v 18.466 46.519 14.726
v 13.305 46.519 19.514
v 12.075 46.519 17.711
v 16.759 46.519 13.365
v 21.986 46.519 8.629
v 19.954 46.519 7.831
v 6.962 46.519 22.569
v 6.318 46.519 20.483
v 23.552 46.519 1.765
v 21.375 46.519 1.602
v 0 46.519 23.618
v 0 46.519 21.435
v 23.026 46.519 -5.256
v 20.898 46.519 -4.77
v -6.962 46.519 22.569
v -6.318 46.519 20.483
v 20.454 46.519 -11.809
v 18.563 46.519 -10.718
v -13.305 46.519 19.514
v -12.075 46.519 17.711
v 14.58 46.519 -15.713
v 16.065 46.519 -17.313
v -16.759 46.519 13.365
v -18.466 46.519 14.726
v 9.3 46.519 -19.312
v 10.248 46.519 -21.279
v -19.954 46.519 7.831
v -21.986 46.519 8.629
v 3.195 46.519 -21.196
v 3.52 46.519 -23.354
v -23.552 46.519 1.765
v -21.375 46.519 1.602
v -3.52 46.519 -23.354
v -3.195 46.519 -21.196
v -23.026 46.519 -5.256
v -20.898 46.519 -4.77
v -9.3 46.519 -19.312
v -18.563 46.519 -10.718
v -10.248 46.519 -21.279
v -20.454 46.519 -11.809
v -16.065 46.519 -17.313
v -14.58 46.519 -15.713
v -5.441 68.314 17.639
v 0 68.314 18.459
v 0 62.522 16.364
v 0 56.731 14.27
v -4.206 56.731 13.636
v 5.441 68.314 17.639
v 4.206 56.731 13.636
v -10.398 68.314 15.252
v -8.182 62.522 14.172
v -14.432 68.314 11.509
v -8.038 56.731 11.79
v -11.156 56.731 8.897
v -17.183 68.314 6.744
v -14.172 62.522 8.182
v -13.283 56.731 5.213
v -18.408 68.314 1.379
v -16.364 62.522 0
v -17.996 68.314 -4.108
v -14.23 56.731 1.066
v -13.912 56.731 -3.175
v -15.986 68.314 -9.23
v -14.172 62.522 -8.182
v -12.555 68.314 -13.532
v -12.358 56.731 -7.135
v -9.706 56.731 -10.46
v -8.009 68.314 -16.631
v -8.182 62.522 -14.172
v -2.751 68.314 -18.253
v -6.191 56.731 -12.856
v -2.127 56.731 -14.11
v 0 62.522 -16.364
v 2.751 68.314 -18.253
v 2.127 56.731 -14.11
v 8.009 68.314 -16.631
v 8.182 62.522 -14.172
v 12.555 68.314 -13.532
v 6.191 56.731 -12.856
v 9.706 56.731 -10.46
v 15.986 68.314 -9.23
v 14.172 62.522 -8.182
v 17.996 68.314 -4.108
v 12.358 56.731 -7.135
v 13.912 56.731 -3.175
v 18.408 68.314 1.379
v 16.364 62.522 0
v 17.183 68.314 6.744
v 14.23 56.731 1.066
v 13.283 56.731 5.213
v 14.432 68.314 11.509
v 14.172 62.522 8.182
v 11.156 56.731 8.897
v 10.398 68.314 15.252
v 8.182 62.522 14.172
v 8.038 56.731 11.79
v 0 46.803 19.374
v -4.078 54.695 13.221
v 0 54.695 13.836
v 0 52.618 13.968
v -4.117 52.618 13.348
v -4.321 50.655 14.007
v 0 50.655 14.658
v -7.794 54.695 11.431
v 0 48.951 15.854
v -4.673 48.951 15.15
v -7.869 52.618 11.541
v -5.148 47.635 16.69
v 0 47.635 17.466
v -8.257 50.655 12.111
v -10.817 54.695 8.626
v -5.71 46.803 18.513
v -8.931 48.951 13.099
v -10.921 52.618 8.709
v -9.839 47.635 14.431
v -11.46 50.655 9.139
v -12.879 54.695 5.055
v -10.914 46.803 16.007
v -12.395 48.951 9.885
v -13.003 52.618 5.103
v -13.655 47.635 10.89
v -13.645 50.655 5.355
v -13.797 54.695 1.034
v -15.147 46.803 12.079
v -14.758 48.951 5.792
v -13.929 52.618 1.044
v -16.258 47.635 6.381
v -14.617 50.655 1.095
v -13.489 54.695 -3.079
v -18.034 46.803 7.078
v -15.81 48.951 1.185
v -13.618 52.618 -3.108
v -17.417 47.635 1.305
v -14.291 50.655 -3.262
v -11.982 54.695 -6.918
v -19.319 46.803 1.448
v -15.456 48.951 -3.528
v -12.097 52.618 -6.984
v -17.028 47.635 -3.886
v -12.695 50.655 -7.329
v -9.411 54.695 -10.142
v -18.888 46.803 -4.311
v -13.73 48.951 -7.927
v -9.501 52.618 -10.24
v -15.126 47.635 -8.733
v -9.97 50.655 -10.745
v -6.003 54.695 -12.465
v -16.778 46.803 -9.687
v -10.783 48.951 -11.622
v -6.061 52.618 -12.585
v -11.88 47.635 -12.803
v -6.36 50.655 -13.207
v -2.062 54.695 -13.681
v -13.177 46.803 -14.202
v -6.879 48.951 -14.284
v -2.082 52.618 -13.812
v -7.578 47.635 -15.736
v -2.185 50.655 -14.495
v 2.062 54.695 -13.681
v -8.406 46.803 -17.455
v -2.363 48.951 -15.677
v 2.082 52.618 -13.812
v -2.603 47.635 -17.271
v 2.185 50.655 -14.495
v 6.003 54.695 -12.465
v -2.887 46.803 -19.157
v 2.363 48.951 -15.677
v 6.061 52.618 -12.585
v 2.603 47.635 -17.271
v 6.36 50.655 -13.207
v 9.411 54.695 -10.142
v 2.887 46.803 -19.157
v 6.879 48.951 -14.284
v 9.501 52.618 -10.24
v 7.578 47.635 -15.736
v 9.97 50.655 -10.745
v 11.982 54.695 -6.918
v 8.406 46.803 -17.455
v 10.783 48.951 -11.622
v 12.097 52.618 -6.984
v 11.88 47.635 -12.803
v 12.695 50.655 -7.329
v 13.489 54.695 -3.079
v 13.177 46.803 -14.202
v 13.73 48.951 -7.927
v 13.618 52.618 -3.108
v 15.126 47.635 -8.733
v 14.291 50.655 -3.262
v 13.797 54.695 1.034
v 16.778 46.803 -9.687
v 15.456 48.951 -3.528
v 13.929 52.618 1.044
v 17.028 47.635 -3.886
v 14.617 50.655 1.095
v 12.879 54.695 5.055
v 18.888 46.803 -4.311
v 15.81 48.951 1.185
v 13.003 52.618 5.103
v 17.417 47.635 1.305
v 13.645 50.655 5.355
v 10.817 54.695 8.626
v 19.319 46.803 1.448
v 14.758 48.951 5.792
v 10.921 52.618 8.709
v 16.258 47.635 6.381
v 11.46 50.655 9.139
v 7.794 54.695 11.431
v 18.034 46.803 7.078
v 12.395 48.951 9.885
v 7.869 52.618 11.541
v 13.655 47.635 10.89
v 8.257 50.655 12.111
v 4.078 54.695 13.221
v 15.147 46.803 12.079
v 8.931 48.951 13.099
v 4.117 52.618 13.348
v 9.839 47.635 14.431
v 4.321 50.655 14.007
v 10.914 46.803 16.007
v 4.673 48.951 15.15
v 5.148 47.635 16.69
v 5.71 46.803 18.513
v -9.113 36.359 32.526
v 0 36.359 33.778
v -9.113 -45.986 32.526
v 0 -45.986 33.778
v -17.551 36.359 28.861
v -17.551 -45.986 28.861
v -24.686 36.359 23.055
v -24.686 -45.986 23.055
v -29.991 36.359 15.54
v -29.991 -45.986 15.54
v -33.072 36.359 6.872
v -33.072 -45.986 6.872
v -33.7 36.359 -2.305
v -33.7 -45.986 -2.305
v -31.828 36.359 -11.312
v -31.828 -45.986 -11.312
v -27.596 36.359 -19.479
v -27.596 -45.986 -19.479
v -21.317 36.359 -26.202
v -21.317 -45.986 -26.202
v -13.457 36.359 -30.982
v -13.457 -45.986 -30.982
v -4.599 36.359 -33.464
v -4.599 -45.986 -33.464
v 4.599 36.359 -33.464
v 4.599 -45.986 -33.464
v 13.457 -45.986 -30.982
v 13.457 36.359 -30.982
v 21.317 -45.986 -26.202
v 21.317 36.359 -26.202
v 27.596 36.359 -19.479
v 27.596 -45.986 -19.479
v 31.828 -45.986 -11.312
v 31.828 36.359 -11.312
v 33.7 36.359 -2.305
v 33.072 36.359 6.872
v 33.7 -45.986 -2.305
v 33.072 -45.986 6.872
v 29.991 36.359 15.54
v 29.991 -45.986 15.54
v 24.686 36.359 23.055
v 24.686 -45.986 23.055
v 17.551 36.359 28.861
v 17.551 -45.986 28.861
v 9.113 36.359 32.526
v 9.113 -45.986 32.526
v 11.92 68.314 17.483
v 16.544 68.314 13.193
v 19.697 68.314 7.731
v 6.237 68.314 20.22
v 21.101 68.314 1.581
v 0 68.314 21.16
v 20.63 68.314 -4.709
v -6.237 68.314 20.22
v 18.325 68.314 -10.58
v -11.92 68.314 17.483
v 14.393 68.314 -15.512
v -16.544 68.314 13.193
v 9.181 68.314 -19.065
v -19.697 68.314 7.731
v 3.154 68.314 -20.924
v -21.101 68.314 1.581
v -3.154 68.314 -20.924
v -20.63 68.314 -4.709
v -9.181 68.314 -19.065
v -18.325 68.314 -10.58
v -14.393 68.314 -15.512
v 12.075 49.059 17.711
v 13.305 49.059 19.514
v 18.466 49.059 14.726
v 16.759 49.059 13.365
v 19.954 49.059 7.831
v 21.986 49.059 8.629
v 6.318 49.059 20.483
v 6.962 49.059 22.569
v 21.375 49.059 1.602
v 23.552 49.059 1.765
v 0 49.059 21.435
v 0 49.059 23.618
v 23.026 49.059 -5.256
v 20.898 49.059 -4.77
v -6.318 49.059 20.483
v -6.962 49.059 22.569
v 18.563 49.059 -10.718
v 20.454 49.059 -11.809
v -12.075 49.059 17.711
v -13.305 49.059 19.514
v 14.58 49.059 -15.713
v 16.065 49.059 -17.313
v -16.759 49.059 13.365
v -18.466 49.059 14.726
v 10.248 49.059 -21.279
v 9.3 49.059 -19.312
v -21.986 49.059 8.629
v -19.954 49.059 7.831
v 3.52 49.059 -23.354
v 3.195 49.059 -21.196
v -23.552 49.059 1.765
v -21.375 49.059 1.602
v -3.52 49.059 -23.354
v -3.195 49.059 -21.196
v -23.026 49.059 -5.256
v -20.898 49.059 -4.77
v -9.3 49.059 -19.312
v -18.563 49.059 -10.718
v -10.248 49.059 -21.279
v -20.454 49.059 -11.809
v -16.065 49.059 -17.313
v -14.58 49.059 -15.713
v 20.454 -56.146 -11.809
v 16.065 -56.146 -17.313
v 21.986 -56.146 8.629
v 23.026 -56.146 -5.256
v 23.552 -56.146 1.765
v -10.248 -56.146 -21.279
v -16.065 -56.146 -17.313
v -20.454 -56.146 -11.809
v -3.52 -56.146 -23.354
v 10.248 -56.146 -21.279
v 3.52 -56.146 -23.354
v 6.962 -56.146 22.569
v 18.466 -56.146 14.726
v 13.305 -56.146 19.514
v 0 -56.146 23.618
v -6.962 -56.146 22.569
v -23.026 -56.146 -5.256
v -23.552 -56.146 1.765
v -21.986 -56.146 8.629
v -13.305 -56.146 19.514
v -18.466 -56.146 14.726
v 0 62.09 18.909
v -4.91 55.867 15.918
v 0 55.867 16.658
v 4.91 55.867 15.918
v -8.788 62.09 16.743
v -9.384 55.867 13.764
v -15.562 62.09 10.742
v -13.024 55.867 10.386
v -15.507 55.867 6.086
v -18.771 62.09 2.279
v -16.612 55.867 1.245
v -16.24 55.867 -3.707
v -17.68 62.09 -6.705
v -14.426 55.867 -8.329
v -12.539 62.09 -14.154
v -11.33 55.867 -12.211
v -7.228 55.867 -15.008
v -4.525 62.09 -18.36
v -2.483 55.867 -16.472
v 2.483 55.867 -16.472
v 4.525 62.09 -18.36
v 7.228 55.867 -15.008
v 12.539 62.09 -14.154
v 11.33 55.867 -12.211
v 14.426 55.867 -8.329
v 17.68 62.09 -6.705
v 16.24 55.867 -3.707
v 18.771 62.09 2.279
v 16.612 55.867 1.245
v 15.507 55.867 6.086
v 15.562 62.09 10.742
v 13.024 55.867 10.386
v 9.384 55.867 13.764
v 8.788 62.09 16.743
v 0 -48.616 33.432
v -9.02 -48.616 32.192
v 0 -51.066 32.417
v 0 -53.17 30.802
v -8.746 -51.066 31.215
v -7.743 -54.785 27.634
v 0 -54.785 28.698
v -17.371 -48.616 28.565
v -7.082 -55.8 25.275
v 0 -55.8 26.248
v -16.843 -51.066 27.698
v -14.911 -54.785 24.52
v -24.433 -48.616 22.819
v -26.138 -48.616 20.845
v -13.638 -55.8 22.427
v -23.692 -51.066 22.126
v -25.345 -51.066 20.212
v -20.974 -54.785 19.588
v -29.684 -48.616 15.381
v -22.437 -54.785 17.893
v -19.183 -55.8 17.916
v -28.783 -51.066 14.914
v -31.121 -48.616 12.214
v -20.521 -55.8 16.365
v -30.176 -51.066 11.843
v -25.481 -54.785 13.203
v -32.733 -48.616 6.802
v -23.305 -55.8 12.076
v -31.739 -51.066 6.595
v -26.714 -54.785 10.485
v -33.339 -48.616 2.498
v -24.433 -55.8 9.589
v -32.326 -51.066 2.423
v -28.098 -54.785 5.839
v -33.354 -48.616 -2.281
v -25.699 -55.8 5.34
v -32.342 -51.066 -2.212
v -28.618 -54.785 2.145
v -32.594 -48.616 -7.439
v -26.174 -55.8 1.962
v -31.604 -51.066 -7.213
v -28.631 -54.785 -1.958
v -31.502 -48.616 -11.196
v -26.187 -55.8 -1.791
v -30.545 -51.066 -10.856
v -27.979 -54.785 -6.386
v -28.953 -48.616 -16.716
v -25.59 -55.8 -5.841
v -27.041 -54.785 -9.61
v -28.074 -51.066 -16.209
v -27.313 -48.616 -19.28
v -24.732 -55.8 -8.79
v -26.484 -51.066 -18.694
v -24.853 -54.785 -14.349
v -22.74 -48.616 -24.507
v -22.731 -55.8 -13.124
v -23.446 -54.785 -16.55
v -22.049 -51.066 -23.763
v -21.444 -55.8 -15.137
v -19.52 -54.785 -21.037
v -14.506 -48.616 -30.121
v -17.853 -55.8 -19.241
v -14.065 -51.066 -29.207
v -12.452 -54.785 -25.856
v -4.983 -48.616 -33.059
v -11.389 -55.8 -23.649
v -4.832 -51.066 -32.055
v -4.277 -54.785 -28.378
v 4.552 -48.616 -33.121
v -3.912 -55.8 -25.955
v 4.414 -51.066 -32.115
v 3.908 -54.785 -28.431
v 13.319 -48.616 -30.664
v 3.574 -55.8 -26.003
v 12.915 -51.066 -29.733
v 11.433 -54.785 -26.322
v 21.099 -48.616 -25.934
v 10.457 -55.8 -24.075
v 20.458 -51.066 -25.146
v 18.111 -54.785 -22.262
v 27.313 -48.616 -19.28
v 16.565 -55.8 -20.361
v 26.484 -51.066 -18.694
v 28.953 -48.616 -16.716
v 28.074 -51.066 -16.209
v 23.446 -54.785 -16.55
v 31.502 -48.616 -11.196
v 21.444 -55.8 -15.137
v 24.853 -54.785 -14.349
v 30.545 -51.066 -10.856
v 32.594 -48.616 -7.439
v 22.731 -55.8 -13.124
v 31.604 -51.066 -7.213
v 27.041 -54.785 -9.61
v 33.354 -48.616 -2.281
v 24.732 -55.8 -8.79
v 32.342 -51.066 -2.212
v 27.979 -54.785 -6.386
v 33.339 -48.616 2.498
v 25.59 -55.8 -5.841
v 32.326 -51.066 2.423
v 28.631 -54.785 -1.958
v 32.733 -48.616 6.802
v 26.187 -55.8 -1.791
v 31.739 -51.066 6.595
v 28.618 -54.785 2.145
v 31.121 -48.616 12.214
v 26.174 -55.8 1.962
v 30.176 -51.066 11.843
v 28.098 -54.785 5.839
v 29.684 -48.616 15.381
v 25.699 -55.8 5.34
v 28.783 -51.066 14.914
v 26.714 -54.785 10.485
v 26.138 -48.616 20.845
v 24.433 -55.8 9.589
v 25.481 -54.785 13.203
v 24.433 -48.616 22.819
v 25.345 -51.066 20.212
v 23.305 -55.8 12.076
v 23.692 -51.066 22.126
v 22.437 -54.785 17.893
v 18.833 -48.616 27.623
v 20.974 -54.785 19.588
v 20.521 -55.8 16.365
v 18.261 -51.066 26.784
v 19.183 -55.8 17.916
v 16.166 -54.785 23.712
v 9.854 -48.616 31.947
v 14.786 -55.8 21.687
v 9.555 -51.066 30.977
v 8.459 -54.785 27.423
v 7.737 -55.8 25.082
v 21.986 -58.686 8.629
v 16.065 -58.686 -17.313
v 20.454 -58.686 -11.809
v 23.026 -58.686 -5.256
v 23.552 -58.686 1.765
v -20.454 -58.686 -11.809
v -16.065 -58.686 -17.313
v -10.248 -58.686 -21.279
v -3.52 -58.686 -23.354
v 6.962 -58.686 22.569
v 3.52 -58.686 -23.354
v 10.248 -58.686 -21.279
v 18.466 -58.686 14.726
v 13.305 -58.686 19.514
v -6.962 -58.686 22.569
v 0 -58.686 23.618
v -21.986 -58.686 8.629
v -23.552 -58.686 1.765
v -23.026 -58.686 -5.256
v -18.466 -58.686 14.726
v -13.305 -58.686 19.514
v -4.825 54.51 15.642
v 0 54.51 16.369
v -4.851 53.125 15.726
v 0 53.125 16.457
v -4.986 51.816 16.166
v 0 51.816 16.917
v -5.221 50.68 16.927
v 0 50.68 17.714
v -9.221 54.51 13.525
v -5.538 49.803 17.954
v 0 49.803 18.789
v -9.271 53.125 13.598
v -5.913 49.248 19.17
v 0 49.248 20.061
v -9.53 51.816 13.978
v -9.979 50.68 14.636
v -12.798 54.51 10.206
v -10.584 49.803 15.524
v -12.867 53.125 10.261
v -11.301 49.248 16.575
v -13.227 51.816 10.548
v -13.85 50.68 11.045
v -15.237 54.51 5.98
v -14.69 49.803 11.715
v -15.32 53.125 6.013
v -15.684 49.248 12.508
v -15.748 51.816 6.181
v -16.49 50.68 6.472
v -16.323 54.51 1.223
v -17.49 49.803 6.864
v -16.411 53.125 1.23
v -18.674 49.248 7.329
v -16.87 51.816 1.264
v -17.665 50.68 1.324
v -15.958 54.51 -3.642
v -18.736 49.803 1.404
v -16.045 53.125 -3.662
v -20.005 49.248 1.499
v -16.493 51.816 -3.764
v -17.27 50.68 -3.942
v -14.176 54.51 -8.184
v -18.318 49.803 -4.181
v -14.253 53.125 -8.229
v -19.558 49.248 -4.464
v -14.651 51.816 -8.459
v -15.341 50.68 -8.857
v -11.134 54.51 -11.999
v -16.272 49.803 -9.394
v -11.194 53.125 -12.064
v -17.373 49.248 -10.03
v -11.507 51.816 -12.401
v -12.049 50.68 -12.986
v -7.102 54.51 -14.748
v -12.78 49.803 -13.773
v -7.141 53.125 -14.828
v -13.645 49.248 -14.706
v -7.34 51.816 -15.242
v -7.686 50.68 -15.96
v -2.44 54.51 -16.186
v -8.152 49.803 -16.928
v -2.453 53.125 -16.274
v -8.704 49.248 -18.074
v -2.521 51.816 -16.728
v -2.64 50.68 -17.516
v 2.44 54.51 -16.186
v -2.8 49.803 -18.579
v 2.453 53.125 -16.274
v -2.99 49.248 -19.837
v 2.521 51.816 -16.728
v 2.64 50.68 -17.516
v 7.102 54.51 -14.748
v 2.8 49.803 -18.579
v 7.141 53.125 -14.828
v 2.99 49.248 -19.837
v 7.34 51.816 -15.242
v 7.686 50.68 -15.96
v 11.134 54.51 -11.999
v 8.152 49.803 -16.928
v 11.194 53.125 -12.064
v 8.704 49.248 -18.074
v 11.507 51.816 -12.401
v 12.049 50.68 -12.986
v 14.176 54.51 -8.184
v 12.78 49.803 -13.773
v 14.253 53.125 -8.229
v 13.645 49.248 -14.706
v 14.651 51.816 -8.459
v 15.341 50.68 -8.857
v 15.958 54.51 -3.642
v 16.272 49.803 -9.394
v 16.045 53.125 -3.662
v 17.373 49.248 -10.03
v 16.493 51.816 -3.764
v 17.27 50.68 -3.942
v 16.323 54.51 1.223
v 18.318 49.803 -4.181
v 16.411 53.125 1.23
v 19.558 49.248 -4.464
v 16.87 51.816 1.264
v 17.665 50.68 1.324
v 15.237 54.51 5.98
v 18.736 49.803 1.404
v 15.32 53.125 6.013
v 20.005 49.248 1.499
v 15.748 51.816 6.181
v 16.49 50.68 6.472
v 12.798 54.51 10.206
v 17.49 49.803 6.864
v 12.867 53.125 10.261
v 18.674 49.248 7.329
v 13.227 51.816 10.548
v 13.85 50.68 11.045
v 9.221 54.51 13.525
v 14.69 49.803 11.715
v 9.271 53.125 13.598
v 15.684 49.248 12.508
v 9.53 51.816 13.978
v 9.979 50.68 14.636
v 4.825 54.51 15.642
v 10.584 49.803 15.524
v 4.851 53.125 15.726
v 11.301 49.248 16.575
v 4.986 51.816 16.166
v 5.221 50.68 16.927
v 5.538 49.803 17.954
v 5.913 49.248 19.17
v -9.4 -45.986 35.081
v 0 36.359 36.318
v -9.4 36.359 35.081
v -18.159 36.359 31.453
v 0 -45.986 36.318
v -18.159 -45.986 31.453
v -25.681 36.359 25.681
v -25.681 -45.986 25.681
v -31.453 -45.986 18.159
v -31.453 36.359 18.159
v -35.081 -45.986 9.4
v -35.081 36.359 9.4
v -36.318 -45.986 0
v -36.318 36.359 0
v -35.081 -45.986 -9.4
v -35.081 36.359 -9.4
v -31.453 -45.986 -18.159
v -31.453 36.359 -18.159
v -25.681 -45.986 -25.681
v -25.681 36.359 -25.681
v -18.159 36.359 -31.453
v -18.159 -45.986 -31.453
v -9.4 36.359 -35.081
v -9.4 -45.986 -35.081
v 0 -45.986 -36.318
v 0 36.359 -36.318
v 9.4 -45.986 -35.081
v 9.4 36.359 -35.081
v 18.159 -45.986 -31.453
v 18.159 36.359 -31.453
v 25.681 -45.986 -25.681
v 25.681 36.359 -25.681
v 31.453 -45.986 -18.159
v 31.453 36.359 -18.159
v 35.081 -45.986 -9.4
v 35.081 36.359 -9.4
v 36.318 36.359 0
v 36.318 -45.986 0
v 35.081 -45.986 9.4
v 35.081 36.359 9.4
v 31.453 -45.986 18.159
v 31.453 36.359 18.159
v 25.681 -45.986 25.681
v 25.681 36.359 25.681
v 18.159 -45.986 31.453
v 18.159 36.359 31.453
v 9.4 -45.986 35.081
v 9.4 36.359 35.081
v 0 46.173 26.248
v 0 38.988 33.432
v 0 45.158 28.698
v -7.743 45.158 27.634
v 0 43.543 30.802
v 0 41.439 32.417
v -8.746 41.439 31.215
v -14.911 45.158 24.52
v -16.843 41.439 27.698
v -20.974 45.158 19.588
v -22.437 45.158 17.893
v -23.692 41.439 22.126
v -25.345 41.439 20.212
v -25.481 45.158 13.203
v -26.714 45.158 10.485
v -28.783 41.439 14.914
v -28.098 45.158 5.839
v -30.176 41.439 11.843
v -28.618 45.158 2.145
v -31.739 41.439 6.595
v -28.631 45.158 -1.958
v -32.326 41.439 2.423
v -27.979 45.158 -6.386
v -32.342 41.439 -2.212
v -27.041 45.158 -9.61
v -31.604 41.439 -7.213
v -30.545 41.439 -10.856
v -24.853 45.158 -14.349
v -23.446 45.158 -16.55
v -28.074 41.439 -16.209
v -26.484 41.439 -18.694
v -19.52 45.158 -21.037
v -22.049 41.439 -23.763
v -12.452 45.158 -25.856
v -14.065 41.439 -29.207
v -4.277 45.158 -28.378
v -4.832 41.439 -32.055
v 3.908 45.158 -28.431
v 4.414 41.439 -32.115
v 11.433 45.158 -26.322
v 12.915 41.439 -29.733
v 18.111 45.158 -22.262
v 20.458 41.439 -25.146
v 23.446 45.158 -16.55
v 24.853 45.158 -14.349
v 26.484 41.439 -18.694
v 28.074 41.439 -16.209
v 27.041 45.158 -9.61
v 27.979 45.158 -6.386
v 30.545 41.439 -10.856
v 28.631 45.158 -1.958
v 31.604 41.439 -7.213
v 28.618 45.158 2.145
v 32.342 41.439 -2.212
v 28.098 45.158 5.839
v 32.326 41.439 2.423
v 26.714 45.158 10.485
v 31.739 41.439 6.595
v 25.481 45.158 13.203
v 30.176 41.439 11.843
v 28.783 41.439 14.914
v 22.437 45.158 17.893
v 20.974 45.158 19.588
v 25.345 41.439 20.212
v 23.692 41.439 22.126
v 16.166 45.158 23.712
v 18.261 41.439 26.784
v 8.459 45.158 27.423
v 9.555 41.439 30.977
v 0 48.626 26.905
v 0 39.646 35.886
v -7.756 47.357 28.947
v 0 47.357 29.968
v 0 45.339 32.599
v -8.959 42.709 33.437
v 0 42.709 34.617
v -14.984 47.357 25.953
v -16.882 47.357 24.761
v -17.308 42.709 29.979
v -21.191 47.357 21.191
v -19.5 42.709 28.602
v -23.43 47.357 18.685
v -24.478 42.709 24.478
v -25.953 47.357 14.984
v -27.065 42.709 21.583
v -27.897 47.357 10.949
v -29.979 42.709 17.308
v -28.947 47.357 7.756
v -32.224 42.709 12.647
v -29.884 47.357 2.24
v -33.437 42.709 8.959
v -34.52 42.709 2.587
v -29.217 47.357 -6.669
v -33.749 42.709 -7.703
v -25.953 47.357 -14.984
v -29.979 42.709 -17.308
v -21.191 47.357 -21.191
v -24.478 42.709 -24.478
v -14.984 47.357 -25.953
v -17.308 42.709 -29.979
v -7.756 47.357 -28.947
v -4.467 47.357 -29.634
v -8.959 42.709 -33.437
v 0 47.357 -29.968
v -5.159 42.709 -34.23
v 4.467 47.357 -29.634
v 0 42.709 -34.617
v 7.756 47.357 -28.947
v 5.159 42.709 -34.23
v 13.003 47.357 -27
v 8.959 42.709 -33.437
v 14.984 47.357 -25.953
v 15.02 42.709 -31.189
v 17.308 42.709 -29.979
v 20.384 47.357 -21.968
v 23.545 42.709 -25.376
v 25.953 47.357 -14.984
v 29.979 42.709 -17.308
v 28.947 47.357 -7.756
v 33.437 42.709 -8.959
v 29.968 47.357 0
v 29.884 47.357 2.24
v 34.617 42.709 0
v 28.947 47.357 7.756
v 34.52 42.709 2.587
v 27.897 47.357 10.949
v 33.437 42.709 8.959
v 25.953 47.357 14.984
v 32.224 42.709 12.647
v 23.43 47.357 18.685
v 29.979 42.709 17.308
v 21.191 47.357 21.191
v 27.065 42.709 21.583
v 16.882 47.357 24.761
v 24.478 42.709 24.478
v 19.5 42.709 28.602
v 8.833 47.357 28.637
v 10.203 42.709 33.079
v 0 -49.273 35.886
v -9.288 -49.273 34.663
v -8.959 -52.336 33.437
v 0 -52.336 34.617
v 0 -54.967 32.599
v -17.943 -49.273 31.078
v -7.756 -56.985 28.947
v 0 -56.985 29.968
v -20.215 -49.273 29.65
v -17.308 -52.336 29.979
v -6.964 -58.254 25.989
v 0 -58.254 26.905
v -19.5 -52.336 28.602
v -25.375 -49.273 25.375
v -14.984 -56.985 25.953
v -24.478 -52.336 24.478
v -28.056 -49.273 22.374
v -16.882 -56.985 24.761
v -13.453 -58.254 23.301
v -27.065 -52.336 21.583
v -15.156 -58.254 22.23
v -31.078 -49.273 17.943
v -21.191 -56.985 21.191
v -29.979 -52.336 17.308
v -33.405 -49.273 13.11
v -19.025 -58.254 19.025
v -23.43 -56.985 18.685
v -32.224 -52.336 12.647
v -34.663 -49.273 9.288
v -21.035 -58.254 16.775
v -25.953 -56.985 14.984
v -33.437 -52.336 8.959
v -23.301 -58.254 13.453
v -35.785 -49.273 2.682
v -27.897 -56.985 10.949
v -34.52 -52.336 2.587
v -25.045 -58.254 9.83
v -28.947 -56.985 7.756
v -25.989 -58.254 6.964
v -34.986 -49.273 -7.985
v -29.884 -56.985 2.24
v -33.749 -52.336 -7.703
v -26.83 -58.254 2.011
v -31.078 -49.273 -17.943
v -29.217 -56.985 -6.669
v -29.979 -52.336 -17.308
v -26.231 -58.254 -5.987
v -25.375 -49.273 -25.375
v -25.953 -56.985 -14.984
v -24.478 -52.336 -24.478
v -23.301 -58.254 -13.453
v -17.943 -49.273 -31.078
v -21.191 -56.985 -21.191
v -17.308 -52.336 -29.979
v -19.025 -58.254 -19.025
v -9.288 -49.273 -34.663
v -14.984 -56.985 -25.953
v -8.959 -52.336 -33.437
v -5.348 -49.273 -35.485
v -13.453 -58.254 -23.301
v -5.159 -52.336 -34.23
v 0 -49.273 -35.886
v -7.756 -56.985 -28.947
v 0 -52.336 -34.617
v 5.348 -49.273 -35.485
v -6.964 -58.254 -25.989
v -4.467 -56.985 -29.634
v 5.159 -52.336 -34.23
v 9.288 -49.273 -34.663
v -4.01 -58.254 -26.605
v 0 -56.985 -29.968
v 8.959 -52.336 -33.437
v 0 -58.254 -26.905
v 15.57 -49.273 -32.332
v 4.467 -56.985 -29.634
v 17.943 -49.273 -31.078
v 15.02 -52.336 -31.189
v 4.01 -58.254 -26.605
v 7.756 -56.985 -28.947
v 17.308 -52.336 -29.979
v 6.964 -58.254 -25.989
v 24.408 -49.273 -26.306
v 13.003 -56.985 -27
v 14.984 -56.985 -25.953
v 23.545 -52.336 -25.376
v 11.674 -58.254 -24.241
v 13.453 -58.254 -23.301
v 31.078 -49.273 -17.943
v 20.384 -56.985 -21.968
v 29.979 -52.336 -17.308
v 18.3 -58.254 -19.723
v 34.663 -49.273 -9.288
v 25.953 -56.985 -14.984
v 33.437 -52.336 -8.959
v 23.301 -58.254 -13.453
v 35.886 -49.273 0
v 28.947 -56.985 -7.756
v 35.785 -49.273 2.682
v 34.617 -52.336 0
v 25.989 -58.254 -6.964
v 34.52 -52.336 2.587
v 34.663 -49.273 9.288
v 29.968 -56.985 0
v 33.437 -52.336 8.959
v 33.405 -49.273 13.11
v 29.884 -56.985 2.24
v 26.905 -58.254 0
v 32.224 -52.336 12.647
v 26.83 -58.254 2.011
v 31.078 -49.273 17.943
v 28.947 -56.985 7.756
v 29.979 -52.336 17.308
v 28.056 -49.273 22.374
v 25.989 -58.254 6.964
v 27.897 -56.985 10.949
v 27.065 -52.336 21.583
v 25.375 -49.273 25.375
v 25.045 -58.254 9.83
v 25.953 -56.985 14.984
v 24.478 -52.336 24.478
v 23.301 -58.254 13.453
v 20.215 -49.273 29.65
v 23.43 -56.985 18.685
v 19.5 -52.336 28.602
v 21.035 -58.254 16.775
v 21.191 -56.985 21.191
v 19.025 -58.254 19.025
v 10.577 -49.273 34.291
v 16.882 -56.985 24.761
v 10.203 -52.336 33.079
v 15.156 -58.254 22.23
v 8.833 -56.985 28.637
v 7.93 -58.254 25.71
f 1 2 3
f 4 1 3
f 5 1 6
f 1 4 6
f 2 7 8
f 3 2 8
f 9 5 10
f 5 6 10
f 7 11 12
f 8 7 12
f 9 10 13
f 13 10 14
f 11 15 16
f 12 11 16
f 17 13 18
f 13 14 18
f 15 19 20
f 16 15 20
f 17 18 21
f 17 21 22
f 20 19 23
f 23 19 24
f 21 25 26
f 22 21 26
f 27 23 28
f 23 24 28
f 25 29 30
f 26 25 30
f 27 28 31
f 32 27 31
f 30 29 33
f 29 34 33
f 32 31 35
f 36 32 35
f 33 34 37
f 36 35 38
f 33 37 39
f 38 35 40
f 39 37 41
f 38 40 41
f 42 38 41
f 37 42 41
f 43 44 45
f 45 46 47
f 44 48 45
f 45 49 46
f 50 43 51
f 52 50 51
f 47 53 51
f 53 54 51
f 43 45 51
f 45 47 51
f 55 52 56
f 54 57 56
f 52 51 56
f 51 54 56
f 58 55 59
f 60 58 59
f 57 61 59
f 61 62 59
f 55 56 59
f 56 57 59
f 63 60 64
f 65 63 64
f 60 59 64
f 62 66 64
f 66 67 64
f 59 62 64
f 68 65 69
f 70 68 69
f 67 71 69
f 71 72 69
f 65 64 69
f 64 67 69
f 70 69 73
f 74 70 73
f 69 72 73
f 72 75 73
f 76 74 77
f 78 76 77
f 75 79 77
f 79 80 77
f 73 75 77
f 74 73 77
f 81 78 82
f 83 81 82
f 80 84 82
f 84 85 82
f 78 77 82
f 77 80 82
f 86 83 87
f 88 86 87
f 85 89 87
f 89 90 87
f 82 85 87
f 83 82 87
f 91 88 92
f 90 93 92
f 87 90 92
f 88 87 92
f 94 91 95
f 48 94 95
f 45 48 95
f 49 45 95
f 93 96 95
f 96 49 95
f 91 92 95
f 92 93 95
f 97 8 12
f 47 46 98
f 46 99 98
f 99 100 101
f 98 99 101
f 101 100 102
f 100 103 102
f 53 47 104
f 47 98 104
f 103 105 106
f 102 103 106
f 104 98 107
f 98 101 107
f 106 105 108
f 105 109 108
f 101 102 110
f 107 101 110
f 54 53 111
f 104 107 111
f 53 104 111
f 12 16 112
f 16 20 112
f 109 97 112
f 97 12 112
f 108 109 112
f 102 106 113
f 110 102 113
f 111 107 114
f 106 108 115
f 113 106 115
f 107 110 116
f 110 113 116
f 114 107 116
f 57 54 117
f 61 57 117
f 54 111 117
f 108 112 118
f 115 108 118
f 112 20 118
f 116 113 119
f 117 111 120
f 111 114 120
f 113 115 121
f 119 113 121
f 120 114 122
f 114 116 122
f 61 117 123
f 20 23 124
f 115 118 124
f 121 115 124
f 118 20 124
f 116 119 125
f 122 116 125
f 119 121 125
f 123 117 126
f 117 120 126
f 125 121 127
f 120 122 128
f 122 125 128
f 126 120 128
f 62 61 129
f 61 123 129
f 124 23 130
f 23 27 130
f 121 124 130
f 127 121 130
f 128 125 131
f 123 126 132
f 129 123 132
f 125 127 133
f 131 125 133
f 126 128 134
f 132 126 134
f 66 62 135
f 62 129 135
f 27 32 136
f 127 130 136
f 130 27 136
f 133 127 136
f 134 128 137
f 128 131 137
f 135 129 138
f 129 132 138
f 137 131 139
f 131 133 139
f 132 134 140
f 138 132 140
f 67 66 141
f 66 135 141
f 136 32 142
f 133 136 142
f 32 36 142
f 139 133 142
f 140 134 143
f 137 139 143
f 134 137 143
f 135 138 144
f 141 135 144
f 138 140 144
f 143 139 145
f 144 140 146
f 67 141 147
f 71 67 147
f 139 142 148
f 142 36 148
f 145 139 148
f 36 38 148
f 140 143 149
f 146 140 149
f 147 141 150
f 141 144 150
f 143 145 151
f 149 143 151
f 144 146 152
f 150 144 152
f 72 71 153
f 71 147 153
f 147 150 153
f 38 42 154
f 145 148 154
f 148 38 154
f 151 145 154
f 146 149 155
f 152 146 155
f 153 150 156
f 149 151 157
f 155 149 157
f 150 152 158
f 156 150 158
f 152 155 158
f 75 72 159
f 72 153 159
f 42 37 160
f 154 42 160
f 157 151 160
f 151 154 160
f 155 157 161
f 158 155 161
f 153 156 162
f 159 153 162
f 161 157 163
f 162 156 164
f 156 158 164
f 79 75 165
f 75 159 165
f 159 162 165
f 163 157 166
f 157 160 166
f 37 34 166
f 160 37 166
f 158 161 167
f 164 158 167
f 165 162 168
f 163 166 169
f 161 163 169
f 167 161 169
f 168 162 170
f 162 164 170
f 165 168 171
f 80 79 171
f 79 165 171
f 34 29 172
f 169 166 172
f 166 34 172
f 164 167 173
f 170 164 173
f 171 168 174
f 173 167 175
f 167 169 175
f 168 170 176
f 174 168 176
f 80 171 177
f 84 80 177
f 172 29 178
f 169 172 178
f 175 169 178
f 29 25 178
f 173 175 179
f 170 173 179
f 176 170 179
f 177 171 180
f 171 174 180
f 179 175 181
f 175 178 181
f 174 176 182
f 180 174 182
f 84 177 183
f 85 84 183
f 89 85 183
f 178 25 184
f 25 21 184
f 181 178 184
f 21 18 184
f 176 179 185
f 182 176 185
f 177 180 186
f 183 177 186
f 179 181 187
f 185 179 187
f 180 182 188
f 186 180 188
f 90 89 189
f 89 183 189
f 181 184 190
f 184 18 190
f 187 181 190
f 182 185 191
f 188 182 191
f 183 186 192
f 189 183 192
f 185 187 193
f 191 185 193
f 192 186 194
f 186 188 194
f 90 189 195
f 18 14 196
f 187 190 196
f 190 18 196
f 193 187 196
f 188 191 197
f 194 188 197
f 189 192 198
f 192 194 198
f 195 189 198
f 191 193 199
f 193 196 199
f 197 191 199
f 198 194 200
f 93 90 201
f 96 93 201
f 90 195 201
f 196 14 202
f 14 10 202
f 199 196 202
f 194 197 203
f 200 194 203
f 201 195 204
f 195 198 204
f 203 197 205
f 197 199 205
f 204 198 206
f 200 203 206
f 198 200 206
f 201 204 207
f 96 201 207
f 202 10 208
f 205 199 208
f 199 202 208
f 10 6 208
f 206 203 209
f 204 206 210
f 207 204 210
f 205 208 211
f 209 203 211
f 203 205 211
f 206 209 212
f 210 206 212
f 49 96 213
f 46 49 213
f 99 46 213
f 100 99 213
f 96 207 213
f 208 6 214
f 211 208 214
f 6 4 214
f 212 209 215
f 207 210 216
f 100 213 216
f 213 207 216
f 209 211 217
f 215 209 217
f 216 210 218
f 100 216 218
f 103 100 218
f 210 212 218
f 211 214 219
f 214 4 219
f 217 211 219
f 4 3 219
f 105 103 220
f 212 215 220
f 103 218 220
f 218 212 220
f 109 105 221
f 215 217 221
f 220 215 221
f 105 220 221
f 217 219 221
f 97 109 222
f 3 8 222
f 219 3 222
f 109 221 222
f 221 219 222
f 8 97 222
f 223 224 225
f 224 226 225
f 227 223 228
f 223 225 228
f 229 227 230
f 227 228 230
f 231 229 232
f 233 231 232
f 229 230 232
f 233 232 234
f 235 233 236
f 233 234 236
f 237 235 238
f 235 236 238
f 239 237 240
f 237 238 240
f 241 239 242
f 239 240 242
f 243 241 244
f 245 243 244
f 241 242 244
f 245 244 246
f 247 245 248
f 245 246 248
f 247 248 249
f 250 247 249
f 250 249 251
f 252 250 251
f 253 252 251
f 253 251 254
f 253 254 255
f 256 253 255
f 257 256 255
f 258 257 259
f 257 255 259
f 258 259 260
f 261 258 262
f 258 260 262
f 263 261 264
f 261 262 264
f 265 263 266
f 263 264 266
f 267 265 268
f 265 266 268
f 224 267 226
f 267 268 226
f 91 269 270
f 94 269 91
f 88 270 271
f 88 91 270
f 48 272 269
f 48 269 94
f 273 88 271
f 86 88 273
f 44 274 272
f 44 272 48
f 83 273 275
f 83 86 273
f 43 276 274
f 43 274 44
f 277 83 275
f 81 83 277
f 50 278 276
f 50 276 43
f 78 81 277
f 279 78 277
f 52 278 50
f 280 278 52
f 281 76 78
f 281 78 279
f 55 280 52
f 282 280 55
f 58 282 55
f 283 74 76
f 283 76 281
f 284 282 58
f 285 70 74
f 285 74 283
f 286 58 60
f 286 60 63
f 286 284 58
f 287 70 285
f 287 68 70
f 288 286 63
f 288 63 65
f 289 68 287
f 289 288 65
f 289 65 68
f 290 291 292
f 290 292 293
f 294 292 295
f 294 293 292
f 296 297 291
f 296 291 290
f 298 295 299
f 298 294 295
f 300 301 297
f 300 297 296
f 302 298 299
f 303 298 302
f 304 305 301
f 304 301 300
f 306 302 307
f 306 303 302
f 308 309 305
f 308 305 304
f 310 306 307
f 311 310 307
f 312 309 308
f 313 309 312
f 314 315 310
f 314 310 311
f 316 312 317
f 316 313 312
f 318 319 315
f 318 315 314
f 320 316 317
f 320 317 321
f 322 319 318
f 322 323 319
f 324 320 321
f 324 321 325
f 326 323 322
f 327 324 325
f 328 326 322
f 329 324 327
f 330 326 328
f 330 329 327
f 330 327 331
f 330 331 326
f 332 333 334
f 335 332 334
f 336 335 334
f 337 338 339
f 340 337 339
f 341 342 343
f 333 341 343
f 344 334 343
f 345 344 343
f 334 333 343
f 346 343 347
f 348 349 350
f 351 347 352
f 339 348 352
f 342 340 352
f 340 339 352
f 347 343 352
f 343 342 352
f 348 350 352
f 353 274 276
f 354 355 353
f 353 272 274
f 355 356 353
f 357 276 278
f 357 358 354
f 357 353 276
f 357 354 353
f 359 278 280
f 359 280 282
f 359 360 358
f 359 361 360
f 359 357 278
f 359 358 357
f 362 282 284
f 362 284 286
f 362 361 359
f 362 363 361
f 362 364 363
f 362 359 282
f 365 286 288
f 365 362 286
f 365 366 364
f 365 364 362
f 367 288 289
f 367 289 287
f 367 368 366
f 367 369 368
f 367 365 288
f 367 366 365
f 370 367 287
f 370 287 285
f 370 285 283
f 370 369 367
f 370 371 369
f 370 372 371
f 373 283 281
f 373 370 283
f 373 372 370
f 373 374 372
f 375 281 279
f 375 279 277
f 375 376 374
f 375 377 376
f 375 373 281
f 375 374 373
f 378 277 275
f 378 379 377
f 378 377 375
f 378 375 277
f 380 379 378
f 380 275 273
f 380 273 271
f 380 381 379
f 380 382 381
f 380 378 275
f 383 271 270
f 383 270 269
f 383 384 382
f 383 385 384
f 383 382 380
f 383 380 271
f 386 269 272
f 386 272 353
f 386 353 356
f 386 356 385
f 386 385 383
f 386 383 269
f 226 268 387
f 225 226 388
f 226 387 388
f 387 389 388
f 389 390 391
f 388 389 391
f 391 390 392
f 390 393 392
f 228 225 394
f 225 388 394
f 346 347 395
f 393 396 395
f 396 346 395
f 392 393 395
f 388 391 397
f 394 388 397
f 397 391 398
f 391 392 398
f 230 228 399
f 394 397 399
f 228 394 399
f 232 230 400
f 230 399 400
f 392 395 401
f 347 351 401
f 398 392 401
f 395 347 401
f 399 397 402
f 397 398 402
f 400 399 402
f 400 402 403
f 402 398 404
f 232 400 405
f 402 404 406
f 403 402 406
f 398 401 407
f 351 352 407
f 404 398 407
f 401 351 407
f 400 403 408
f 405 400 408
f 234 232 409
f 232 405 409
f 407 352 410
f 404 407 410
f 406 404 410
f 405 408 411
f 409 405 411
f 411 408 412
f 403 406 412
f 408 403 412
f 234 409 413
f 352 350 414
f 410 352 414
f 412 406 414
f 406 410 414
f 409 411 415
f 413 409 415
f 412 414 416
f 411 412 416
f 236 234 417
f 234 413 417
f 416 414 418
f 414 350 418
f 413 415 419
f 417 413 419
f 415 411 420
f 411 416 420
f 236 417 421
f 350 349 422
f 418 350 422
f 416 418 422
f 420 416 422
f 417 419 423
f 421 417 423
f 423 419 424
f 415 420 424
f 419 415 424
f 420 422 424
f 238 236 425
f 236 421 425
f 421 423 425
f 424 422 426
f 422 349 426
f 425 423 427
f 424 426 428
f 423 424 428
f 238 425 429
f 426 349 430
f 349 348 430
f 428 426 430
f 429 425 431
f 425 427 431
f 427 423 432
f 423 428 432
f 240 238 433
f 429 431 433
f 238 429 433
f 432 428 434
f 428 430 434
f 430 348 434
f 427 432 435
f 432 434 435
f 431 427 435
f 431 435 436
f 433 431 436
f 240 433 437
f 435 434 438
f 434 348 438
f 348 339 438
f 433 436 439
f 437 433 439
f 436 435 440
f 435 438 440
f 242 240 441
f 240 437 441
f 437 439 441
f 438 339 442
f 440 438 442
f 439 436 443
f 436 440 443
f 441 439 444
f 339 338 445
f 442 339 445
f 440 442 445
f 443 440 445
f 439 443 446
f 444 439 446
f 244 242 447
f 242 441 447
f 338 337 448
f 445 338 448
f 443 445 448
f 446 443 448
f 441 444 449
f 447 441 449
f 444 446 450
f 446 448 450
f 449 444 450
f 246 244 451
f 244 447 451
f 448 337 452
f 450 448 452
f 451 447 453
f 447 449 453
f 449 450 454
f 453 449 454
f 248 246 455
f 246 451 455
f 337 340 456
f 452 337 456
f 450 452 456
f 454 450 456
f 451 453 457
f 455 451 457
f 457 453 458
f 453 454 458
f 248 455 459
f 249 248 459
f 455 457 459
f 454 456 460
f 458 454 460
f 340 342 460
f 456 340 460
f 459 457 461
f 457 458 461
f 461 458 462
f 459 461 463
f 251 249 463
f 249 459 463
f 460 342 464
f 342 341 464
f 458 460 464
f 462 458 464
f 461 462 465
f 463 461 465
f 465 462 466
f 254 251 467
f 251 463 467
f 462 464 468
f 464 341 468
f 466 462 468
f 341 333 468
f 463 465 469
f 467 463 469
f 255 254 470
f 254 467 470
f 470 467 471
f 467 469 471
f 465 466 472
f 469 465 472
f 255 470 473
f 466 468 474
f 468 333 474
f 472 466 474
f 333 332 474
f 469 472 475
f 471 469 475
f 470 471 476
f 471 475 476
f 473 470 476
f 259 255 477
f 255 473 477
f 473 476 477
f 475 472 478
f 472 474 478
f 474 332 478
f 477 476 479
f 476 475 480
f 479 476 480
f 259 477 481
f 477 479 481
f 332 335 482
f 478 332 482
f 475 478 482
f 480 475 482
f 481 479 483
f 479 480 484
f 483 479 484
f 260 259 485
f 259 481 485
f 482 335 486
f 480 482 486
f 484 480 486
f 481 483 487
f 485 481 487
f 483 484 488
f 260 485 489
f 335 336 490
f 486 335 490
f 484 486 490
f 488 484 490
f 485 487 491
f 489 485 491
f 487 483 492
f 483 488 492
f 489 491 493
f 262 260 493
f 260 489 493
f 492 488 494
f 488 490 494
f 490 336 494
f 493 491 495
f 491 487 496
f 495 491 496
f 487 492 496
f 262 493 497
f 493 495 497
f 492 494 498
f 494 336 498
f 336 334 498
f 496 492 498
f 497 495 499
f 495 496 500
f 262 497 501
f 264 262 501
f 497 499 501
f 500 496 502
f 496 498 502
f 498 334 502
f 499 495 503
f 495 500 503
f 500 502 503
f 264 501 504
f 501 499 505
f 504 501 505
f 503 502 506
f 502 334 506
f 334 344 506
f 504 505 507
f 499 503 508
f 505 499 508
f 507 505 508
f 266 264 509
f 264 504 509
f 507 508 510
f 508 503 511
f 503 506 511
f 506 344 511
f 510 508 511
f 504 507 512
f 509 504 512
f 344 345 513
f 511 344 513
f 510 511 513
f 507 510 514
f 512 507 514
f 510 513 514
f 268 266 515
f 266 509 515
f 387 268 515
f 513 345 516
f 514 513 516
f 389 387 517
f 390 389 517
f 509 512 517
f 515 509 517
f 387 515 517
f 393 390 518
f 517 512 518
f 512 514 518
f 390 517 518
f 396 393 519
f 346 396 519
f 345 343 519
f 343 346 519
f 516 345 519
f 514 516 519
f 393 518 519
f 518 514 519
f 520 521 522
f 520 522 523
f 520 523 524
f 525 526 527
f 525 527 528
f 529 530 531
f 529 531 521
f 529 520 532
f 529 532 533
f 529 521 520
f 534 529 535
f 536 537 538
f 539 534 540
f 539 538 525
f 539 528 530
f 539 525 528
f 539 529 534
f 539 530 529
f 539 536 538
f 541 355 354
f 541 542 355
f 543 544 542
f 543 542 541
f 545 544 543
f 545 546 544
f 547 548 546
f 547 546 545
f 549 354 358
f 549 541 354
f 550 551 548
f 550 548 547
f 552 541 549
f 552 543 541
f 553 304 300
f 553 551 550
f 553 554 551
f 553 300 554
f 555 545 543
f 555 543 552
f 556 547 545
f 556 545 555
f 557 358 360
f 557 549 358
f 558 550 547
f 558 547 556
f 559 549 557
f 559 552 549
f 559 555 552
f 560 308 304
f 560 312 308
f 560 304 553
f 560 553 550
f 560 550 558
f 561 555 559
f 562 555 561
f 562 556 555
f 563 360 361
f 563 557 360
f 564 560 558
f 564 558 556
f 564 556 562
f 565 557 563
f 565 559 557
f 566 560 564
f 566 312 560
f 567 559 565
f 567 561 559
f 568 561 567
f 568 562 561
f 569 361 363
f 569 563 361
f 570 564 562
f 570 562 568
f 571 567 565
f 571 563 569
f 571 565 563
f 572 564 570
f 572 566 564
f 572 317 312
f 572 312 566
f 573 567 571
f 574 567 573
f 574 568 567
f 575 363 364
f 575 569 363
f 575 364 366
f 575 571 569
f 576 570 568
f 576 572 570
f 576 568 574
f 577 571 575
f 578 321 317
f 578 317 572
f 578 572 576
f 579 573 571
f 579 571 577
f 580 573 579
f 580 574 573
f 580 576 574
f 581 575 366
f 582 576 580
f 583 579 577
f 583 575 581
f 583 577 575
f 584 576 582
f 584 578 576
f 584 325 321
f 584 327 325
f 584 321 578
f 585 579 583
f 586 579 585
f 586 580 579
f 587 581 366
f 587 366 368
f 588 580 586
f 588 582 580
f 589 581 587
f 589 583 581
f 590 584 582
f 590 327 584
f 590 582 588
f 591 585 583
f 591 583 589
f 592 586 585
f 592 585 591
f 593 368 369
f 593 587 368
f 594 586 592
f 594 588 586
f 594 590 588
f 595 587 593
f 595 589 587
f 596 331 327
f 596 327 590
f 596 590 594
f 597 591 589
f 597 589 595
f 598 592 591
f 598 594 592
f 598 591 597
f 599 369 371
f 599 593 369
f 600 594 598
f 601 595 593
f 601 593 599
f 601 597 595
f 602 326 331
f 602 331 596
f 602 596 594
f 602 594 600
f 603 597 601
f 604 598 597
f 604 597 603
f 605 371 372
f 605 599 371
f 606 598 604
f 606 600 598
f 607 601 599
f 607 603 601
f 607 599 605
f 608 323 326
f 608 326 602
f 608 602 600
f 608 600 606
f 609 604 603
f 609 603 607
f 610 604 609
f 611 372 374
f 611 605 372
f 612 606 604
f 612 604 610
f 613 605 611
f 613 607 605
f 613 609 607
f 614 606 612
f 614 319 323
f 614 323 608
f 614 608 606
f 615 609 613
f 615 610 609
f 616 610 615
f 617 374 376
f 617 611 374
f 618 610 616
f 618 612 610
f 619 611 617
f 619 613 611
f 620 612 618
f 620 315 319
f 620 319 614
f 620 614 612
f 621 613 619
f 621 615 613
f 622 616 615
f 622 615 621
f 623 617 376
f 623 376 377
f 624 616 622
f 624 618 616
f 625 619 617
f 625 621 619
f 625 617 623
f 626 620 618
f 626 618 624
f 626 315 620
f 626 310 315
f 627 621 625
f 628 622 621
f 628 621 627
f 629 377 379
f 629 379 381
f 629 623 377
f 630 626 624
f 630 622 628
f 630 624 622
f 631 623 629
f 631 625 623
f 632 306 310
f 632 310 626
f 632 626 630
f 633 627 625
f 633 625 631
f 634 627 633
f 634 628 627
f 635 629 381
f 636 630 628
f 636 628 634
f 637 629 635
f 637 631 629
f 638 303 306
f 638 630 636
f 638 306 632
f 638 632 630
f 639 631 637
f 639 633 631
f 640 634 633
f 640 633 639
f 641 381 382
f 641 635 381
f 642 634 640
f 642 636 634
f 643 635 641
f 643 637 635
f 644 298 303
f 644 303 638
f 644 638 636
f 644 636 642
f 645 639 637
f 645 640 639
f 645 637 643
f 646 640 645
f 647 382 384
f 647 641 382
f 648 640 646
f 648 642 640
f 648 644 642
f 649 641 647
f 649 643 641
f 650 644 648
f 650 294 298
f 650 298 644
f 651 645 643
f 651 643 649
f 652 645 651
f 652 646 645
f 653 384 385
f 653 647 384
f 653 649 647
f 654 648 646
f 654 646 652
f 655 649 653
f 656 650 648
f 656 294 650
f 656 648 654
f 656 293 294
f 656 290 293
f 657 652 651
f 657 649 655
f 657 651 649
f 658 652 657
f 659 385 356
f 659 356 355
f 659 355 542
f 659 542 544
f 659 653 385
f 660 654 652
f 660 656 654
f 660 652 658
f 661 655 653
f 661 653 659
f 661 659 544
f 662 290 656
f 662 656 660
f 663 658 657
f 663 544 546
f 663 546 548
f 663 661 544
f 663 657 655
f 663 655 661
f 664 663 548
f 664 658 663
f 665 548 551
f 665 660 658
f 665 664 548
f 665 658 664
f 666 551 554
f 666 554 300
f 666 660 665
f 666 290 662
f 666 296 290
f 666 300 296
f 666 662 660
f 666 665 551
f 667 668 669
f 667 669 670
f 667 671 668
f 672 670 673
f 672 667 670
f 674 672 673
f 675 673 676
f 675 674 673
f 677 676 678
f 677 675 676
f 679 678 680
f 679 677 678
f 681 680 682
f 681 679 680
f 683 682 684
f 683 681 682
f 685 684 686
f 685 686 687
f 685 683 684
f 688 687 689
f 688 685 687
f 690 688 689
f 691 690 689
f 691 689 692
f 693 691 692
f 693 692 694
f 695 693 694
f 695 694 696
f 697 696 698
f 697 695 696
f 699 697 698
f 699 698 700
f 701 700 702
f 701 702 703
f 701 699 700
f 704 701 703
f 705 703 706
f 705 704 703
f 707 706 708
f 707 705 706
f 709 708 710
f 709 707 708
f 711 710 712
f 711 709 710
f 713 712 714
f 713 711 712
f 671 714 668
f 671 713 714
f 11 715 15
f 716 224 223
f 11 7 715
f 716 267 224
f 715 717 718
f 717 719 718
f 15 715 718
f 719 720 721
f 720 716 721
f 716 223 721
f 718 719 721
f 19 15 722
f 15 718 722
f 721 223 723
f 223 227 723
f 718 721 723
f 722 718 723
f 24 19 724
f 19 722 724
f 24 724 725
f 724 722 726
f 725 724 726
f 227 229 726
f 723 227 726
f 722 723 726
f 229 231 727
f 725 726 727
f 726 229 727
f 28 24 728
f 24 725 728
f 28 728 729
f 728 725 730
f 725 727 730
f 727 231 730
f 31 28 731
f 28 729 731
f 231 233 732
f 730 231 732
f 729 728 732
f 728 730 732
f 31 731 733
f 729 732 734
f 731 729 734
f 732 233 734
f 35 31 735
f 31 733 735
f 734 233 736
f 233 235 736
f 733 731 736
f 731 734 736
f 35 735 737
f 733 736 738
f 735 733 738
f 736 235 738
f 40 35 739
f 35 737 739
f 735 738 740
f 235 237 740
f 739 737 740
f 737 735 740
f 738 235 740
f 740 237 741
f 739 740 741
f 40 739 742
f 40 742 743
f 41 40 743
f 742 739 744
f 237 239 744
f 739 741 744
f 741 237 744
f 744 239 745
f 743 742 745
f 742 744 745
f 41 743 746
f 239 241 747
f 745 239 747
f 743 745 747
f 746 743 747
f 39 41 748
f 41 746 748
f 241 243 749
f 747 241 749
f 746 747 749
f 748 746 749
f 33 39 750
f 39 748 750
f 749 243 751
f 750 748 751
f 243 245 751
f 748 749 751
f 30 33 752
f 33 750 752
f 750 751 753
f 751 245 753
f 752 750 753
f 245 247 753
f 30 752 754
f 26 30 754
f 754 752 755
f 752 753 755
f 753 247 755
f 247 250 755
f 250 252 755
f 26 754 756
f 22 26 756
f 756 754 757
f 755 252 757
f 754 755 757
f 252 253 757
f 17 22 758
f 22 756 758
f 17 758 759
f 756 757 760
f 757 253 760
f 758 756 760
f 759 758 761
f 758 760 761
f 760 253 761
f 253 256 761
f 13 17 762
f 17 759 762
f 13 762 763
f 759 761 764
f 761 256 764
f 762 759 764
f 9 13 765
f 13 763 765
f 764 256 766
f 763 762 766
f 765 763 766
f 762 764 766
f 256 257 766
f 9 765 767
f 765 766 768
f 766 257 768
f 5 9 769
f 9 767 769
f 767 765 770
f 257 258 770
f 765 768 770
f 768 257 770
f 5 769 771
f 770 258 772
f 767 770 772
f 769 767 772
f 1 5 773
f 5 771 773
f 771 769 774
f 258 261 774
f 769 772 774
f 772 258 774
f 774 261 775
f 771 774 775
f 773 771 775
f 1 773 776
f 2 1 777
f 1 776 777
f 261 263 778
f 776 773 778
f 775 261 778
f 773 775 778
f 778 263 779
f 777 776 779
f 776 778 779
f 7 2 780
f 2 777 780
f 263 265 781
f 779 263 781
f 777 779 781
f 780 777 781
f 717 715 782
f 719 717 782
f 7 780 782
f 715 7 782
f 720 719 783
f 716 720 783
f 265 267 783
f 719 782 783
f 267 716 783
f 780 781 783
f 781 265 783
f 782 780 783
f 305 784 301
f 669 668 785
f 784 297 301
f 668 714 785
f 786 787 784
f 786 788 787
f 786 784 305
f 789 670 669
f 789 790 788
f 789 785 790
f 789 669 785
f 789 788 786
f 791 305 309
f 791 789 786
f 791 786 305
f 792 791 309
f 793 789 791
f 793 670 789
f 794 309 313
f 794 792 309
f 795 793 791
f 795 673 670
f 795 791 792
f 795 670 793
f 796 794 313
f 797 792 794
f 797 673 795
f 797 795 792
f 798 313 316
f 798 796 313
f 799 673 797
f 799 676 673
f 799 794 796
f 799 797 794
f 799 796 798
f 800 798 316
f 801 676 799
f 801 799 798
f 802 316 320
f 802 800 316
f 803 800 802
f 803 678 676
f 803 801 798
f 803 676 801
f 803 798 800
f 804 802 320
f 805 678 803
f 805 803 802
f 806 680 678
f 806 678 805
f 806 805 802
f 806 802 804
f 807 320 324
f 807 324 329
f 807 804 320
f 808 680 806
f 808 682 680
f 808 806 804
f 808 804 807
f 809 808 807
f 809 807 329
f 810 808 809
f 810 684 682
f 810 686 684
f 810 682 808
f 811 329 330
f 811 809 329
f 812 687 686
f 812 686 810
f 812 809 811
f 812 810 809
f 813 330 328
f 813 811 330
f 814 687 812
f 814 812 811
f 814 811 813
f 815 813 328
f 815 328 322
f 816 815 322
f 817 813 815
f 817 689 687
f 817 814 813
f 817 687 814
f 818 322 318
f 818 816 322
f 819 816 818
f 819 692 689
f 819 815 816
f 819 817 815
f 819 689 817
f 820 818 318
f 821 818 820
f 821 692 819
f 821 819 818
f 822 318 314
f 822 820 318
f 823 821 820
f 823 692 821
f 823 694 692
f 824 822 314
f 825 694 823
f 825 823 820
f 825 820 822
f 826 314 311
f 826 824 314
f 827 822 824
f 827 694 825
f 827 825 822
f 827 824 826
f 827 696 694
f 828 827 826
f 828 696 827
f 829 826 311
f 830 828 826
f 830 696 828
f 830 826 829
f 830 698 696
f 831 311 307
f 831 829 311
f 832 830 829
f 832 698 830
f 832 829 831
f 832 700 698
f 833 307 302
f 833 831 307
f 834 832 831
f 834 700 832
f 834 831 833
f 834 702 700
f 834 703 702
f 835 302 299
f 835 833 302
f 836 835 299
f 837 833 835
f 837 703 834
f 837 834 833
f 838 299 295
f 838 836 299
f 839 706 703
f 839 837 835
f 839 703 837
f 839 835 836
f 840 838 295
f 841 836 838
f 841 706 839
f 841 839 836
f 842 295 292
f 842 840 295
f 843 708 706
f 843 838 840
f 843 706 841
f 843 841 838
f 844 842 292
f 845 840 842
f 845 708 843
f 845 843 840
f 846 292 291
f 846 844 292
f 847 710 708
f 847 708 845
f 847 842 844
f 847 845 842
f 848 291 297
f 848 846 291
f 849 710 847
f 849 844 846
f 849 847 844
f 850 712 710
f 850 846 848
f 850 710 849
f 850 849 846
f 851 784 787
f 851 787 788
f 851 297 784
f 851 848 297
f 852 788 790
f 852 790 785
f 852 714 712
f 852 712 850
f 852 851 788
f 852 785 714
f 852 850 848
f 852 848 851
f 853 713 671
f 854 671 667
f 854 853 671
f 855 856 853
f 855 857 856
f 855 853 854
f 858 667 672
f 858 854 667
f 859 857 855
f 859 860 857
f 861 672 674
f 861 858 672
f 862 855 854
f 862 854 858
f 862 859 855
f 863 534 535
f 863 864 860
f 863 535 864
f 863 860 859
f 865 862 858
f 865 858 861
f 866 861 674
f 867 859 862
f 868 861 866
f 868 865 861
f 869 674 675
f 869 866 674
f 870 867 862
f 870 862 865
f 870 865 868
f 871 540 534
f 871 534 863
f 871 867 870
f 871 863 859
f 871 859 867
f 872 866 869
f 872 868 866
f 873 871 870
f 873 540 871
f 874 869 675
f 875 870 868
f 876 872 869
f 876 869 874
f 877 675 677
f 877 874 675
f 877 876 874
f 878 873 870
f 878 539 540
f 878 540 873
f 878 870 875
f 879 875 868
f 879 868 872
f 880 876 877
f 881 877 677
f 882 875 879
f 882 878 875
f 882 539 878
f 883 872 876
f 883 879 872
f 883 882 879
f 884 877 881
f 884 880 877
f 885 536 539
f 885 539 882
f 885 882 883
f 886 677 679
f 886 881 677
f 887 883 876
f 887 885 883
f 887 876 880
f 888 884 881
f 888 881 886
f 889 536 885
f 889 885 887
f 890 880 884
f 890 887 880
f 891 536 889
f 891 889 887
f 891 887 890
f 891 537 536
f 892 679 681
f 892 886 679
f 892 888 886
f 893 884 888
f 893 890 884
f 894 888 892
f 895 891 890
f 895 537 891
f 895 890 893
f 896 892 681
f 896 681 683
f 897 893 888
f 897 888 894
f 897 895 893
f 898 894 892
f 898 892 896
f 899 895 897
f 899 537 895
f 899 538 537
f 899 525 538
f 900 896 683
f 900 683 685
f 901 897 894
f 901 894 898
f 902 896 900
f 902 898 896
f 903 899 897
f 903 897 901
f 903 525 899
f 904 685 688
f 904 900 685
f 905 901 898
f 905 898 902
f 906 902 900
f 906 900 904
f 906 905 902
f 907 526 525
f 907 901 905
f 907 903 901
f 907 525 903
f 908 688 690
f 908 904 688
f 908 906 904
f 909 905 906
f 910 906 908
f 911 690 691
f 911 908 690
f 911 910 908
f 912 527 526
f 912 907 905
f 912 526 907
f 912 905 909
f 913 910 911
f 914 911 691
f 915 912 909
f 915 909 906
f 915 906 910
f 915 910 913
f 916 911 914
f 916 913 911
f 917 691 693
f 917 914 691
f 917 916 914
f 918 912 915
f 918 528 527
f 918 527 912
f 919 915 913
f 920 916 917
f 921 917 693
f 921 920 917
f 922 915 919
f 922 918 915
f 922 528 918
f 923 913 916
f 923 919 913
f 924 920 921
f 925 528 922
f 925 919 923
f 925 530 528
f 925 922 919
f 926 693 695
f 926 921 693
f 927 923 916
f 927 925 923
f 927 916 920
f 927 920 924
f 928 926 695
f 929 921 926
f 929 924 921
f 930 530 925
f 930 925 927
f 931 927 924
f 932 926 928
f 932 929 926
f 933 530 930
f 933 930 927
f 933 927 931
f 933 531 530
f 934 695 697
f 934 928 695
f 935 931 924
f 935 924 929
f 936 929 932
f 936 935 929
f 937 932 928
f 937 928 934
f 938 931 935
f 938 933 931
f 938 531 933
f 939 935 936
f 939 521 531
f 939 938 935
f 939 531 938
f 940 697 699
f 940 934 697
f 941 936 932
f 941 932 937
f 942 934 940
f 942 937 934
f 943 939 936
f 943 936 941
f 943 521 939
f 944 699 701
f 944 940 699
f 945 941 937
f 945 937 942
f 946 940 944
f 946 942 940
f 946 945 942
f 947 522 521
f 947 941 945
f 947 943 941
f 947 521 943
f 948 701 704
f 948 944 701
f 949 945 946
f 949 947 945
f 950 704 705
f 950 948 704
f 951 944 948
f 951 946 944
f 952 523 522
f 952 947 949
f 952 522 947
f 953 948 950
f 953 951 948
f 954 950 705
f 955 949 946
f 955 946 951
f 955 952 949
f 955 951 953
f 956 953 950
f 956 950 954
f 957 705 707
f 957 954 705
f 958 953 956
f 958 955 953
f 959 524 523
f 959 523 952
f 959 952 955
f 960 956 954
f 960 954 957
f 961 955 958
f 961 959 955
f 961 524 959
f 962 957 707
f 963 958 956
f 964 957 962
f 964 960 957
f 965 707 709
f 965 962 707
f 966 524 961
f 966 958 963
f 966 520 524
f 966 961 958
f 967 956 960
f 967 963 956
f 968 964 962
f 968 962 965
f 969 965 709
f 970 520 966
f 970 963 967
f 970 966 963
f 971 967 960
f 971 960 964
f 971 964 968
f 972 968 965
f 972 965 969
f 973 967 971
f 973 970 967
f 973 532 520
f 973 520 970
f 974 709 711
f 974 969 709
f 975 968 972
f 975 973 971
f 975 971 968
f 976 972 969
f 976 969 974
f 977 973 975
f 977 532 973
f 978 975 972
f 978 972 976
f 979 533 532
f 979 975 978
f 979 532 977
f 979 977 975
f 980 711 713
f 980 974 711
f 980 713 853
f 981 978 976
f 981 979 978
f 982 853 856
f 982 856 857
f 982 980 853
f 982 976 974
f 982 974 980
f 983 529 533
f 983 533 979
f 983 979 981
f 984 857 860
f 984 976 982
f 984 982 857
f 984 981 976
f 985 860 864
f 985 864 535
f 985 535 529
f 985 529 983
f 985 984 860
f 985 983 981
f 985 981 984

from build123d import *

# Parameters (mm, degrees)
SHELL1_T = -2.54


with BuildPart() as part:
    # Sketch1 → Revolve1 (revolve)
    with BuildSketch(Plane.XY, mode=Mode.PRIVATE) as revolve1_sk:
        with BuildLine():
            Line((0, 68.313709677), (-21.160220955, 68.313709677))
            Line((-21.160220955, 68.313709677), (-16.658133593, 55.866762263))
            ThreePointArc((-16.658133593, 55.866762263), (-17.276874479, 51.220934006), (-21.435244819, 49.058870968))
            Line((-21.435244819, 49.058870968), (-23.618285471, 49.058870968))
            ThreePointArc((-23.618285471, 49.058870968), (-32.598541593, 45.339127089), (-36.318285471, 36.358870968))
            Line((-36.318285471, 36.358870968), (-36.318285471, -45.986290323))
            ThreePointArc((-36.318285471, -45.986290323), (-32.598541593, -54.966546444), (-23.618285471, -58.686290323))
            Line((-23.618285471, -58.686290323), (0, -58.686290323))
            Line((0, -58.686290323), (0, 68.313709677))
        make_face()
    revolve(revolve1_sk.sketch.rotate(Axis((0, 68.313709677, 0), (0, -1, 0)), 270), axis=Axis((0, 68.313709677, 0), (0, -1, 0)))

    # Shell1
    shell1_openings = [part.faces().sort_by_distance(p)[0] for p in [
        (0, 68.313709677, 0),
    ]]
    offset(amount=SHELL1_T, openings=shell1_openings, kind=Kind.INTERSECTION)


solid = part.part
